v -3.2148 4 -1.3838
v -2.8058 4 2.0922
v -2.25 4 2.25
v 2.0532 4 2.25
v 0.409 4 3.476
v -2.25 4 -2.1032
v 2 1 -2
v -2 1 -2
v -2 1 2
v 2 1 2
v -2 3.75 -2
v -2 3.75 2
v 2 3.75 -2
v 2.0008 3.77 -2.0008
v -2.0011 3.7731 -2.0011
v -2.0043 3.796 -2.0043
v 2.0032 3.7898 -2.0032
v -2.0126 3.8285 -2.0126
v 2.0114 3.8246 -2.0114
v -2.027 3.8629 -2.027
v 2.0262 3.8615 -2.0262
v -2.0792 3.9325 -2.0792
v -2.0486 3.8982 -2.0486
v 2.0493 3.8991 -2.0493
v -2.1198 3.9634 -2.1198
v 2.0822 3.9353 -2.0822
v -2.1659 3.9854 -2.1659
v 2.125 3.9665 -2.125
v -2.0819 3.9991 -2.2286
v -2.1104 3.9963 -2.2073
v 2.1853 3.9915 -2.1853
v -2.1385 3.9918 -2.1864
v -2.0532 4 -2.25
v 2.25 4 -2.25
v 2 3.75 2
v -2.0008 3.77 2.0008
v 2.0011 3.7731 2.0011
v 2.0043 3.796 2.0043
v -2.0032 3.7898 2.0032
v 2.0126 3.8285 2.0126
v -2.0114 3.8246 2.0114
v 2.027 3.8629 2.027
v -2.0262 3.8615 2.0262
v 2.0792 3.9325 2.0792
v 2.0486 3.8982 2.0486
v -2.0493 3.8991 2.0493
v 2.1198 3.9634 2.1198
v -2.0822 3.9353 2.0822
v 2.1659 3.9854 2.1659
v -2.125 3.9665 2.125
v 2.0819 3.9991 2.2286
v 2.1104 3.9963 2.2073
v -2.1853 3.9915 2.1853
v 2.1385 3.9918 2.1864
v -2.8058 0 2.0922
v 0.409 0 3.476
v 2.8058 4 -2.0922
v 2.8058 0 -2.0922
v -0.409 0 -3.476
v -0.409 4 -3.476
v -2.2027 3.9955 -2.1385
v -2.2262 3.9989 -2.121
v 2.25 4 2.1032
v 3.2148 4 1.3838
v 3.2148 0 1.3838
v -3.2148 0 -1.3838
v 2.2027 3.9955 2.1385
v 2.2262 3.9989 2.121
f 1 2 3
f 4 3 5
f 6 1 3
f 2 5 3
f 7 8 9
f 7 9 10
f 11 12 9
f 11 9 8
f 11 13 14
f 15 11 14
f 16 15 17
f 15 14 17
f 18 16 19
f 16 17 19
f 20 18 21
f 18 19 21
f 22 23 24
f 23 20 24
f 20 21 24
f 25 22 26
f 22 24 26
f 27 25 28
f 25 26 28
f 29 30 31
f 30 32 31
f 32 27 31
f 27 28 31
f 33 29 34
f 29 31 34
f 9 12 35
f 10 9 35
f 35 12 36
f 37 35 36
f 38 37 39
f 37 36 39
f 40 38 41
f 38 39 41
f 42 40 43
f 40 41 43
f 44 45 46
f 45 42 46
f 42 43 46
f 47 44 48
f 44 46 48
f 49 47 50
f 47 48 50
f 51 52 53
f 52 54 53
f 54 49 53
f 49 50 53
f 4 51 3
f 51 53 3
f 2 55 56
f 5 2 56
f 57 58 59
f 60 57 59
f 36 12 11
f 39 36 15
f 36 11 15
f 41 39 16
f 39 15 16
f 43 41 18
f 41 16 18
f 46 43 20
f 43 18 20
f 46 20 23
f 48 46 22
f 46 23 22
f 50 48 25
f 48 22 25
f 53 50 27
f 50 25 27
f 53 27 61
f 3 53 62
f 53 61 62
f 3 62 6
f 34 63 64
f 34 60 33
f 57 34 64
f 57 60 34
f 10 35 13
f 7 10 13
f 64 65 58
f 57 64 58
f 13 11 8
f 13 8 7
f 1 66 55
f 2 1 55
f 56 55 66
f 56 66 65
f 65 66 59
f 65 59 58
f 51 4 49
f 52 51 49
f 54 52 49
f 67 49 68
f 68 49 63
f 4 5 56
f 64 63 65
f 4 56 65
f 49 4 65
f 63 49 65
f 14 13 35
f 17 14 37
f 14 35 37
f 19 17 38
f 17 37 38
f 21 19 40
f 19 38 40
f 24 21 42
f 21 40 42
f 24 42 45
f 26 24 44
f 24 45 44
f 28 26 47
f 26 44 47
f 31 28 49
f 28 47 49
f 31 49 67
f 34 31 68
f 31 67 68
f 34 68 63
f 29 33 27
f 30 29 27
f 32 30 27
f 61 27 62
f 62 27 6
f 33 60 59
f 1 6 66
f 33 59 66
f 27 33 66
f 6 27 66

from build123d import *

# Parameters (mm, degrees)
BOSS_EXTRUDE1_DEPTH = 4
SKETCH2_W           = 4
SKETCH2_H           = 4
CUT_EXTRUDE1_DEPTH  = 3
FILLET1_R           = 0.25


with BuildPart() as part:
    # Sketch1 → Boss-Extrude1 (new body)
    with BuildSketch(Plane(origin=(0, 0, 0), x_dir=(1, 0, 0), z_dir=(0, 1, 0))):
        Polygon((3.214834695, -1.383776673), (2.8058031, 2.092240179), (-0.409031596, 3.476016852), (-3.214834695, 1.383776673), (-2.8058031, -2.092240179), (0.409031596, -3.476016852), align=None)
    extrude(amount=BOSS_EXTRUDE1_DEPTH)

    # Sketch2 → Cut-Extrude1 (cut)
    with BuildSketch(Plane(origin=(0, 4, 0), x_dir=(1, 0, 0), z_dir=(0, 1, 0))):
        Rectangle(SKETCH2_W, SKETCH2_H)
    extrude(amount=-CUT_EXTRUDE1_DEPTH, mode=Mode.SUBTRACT)

    # Fillet1
    # the kernel refuses this fillet: 0.25 mm, written as the material it takes off along each edge
    with BuildSketch(Plane(origin=(-2, 4, -2), x_dir=(-1, 0, 0), z_dir=(0, 0, 1)), Plane(origin=(2, 4, -2), x_dir=(0, 0, -1), z_dir=(-1, 0, 0)), Plane(origin=(-2, 4, 2), x_dir=(0, 0, 1), z_dir=(1, 0, 0)), Plane(origin=(2, 4, 2), x_dir=(1, 0, 0), z_dir=(0, 0, -1))) as fillet1_piece_1:
        with BuildLine():
            CenterArc((FILLET1_R, FILLET1_R), FILLET1_R, 180, 90)
            Line((0, FILLET1_R), (-FILLET1_R * 0.02, FILLET1_R))
            Line((-FILLET1_R * 0.02, FILLET1_R), (-FILLET1_R * 0.02, -FILLET1_R * 0.02))
            Line((-FILLET1_R * 0.02, -FILLET1_R * 0.02), (FILLET1_R, -FILLET1_R * 0.02))
            Line((FILLET1_R, -FILLET1_R * 0.02), (FILLET1_R, 0))
        make_face()
    extrude(amount=4, mode=Mode.SUBTRACT)
    with BuildSketch(Plane(origin=(2, 4, -2), x_dir=(0, 0, -1), z_dir=(-1, 0, 0))) as fillet1_piece_2a_section:
        with BuildLine():
            CenterArc((FILLET1_R, FILLET1_R), FILLET1_R, 180, 90)
            Line((0, FILLET1_R), (-FILLET1_R * 0.02, FILLET1_R))
            Line((-FILLET1_R * 0.02, FILLET1_R), (-FILLET1_R * 0.02, -FILLET1_R * 0.02))
            Line((-FILLET1_R * 0.02, -FILLET1_R * 0.02), (FILLET1_R, -FILLET1_R * 0.02))
            Line((FILLET1_R, -FILLET1_R * 0.02), (FILLET1_R, 0))
        make_face()
    fillet1_piece_2a = extrude(amount=4.625, mode=Mode.PRIVATE)
    fillet1_piece_2a = split(fillet1_piece_2a, bisect_by=Plane(origin=(-2, 3.943401221, -2.056598779), z_dir=(-1, 0, 0)), keep=Keep.TOP, mode=Mode.PRIVATE)
    with BuildSketch(Plane(origin=(-2, 4, -2.625), x_dir=(-1, 0, 0), z_dir=(0, 0, 1))) as fillet1_piece_2b_section:
        with BuildLine():
            CenterArc((FILLET1_R, FILLET1_R), FILLET1_R, 180, 90)
            Line((0, FILLET1_R), (-FILLET1_R * 0.02, FILLET1_R))
            Line((-FILLET1_R * 0.02, FILLET1_R), (-FILLET1_R * 0.02, -FILLET1_R * 0.02))
            Line((-FILLET1_R * 0.02, -FILLET1_R * 0.02), (FILLET1_R, -FILLET1_R * 0.02))
            Line((FILLET1_R, -FILLET1_R * 0.02), (FILLET1_R, 0))
        make_face()
    fillet1_piece_2b = extrude(amount=4.625, mode=Mode.PRIVATE)
    fillet1_piece_2b = split(fillet1_piece_2b, bisect_by=Plane(origin=(-2.056598779, 3.943401221, -2), z_dir=(0, 0, -1)), keep=Keep.TOP, mode=Mode.PRIVATE)
    fillet1_piece_2 = fillet1_piece_2a & fillet1_piece_2b
    add(fillet1_piece_2, mode=Mode.SUBTRACT)
    with BuildSketch(Plane(origin=(-2.625, 4, 2), x_dir=(0, 0, 1), z_dir=(1, 0, 0))) as fillet1_piece_3a_section:
        with BuildLine():
            CenterArc((FILLET1_R, FILLET1_R), FILLET1_R, 180, 90)
            Line((0, FILLET1_R), (-FILLET1_R * 0.02, FILLET1_R))
            Line((-FILLET1_R * 0.02, FILLET1_R), (-FILLET1_R * 0.02, -FILLET1_R * 0.02))
            Line((-FILLET1_R * 0.02, -FILLET1_R * 0.02), (FILLET1_R, -FILLET1_R * 0.02))
            Line((FILLET1_R, -FILLET1_R * 0.02), (FILLET1_R, 0))
        make_face()
    fillet1_piece_3a = extrude(amount=4.625, mode=Mode.PRIVATE)
    fillet1_piece_3a = split(fillet1_piece_3a, bisect_by=Plane(origin=(-2, 3.943401221, 2.056598779), z_dir=(-1, 0, 0)), keep=Keep.TOP, mode=Mode.PRIVATE)
    with BuildSketch(Plane(origin=(-2, 4, -2), x_dir=(-1, 0, 0), z_dir=(0, 0, 1))) as fillet1_piece_3b_section:
        with BuildLine():
            CenterArc((FILLET1_R, FILLET1_R), FILLET1_R, 180, 90)
            Line((0, FILLET1_R), (-FILLET1_R * 0.02, FILLET1_R))
            Line((-FILLET1_R * 0.02, FILLET1_R), (-FILLET1_R * 0.02, -FILLET1_R * 0.02))
            Line((-FILLET1_R * 0.02, -FILLET1_R * 0.02), (FILLET1_R, -FILLET1_R * 0.02))
            Line((FILLET1_R, -FILLET1_R * 0.02), (FILLET1_R, 0))
        make_face()
    fillet1_piece_3b = extrude(amount=4.625, mode=Mode.PRIVATE)
    fillet1_piece_3b = split(fillet1_piece_3b, bisect_by=Plane(origin=(-2.056598779, 3.943401221, 2), z_dir=(0, 0, 1)), keep=Keep.TOP, mode=Mode.PRIVATE)
    fillet1_piece_3 = fillet1_piece_3a & fillet1_piece_3b
    add(fillet1_piece_3, mode=Mode.SUBTRACT)
    with BuildSketch(Plane(origin=(2, 4, 2), x_dir=(1, 0, 0), z_dir=(0, 0, -1))) as fillet1_piece_4a_section:
        with BuildLine():
            CenterArc((FILLET1_R, FILLET1_R), FILLET1_R, 180, 90)
            Line((0, FILLET1_R), (-FILLET1_R * 0.02, FILLET1_R))
            Line((-FILLET1_R * 0.02, FILLET1_R), (-FILLET1_R * 0.02, -FILLET1_R * 0.02))
            Line((-FILLET1_R * 0.02, -FILLET1_R * 0.02), (FILLET1_R, -FILLET1_R * 0.02))
            Line((FILLET1_R, -FILLET1_R * 0.02), (FILLET1_R, 0))
        make_face()
    fillet1_piece_4a = extrude(amount=4.625, mode=Mode.PRIVATE)
    fillet1_piece_4a = split(fillet1_piece_4a, bisect_by=Plane(origin=(2.056598779, 3.943401221, -2), z_dir=(0, 0, -1)), keep=Keep.TOP, mode=Mode.PRIVATE)
    with BuildSketch(Plane(origin=(2.625, 4, -2), x_dir=(0, 0, -1), z_dir=(-1, 0, 0))) as fillet1_piece_4b_section:
        with BuildLine():
            CenterArc((FILLET1_R, FILLET1_R), FILLET1_R, 180, 90)
            Line((0, FILLET1_R), (-FILLET1_R * 0.02, FILLET1_R))
            Line((-FILLET1_R * 0.02, FILLET1_R), (-FILLET1_R * 0.02, -FILLET1_R * 0.02))
            Line((-FILLET1_R * 0.02, -FILLET1_R * 0.02), (FILLET1_R, -FILLET1_R * 0.02))
            Line((FILLET1_R, -FILLET1_R * 0.02), (FILLET1_R, 0))
        make_face()
    fillet1_piece_4b = extrude(amount=4.625, mode=Mode.PRIVATE)
    fillet1_piece_4b = split(fillet1_piece_4b, bisect_by=Plane(origin=(2, 3.943401221, -2.056598779), z_dir=(1, 0, 0)), keep=Keep.TOP, mode=Mode.PRIVATE)
    fillet1_piece_4 = fillet1_piece_4a & fillet1_piece_4b
    add(fillet1_piece_4, mode=Mode.SUBTRACT)
    with BuildSketch(Plane(origin=(-2, 4, 2), x_dir=(0, 0, 1), z_dir=(1, 0, 0))) as fillet1_piece_5a_section:
        with BuildLine():
            CenterArc((FILLET1_R, FILLET1_R), FILLET1_R, 180, 90)
            Line((0, FILLET1_R), (-FILLET1_R * 0.02, FILLET1_R))
            Line((-FILLET1_R * 0.02, FILLET1_R), (-FILLET1_R * 0.02, -FILLET1_R * 0.02))
            Line((-FILLET1_R * 0.02, -FILLET1_R * 0.02), (FILLET1_R, -FILLET1_R * 0.02))
            Line((FILLET1_R, -FILLET1_R * 0.02), (FILLET1_R, 0))
        make_face()
    fillet1_piece_5a = extrude(amount=4.625, mode=Mode.PRIVATE)
    fillet1_piece_5a = split(fillet1_piece_5a, bisect_by=Plane(origin=(2, 3.943401221, 2.056598779), z_dir=(1, 0, 0)), keep=Keep.TOP, mode=Mode.PRIVATE)
    with BuildSketch(Plane(origin=(2, 4, 2.625), x_dir=(1, 0, 0), z_dir=(0, 0, -1))) as fillet1_piece_5b_section:
        with BuildLine():
            CenterArc((FILLET1_R, FILLET1_R), FILLET1_R, 180, 90)
            Line((0, FILLET1_R), (-FILLET1_R * 0.02, FILLET1_R))
            Line((-FILLET1_R * 0.02, FILLET1_R), (-FILLET1_R * 0.02, -FILLET1_R * 0.02))
            Line((-FILLET1_R * 0.02, -FILLET1_R * 0.02), (FILLET1_R, -FILLET1_R * 0.02))
            Line((FILLET1_R, -FILLET1_R * 0.02), (FILLET1_R, 0))
        make_face()
    fillet1_piece_5b = extrude(amount=4.625, mode=Mode.PRIVATE)
    fillet1_piece_5b = split(fillet1_piece_5b, bisect_by=Plane(origin=(2.056598779, 3.943401221, 2), z_dir=(0, 0, 1)), keep=Keep.TOP, mode=Mode.PRIVATE)
    fillet1_piece_5 = fillet1_piece_5a & fillet1_piece_5b
    add(fillet1_piece_5, mode=Mode.SUBTRACT)


solid = part.part
